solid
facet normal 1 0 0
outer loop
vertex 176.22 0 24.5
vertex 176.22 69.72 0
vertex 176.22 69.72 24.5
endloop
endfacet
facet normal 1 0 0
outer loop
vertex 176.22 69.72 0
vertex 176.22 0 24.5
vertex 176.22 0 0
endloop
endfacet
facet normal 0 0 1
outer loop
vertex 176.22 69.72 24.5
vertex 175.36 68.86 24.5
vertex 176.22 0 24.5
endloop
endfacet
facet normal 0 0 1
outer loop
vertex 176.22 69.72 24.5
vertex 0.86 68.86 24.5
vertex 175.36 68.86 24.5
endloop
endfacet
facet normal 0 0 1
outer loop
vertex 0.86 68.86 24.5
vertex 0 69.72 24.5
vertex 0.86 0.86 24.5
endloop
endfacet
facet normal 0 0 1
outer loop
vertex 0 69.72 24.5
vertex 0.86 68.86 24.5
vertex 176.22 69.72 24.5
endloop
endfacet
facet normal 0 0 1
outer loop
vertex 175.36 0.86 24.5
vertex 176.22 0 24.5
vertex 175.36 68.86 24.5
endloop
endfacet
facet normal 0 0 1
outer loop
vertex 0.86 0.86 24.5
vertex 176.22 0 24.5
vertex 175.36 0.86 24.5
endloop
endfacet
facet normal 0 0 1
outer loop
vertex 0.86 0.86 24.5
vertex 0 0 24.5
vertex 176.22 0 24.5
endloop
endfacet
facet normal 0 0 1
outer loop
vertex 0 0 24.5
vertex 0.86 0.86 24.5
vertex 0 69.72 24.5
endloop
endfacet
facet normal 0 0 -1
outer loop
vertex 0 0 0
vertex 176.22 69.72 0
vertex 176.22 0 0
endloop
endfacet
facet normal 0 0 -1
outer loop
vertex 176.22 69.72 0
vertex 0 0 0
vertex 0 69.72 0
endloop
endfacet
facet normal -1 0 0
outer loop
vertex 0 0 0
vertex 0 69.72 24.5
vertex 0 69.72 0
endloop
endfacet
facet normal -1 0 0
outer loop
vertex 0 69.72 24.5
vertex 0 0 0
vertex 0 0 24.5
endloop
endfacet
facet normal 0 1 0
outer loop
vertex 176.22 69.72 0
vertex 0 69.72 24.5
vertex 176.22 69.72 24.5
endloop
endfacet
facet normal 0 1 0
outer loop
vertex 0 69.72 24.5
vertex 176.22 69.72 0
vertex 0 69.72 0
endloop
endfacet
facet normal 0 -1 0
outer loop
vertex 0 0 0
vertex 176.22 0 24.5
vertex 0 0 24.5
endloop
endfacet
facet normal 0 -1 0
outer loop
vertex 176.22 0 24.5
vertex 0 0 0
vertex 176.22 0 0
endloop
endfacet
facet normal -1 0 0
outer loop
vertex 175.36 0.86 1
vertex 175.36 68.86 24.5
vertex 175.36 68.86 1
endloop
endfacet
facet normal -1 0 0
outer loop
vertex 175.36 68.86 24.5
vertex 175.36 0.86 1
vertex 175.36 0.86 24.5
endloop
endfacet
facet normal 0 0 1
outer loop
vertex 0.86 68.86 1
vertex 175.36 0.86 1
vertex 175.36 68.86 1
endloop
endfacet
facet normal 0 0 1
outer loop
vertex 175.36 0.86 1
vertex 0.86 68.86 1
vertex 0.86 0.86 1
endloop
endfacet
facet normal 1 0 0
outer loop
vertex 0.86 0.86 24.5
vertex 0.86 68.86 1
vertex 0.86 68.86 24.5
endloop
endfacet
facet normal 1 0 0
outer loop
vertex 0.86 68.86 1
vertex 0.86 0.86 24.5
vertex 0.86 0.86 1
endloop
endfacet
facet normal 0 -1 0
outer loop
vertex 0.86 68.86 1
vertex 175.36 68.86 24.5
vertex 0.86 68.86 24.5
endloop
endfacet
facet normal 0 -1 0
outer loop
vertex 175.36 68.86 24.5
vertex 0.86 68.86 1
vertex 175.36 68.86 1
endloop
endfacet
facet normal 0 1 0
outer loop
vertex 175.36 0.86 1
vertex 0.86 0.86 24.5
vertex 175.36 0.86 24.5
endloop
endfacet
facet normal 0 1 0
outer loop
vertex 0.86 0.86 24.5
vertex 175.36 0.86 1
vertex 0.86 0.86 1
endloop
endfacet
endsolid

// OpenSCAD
// file: ../lib/defaults.scad
WALL_WIDTH = 0.86;
BOTTOM_HEIGHT = 1.0;
STACK_HEIGHT = 2.5;
STACK_LEEWAY = 0.2;
RADIUS = 3.0;
// file: ../lib/cubes.scad
include<defaults.scad>;

/**
 * Stackable cube (full, no hole).
 *
 * Args:
 *     size: [depth, width, height] vector. These are total dimensions, including the pedestal.
 *     stack_size: [depth, width, height] vector. These are dimensions of the pedestal itself.
 */
module StackableCube(size, stack_size) {
    translate([ 0, 0, stack_size[2] ]) {
        hull() {
            cube([ size[0], size[1], size[2] - stack_size[2] ]);
            translate(
                [ (size[0] - stack_size[0]) / 2, (size[1] - stack_size[1]) / 2, -(size[0] - stack_size[0]) / 1.25 ]
            ) cube(stack_size);
        }
        translate([ (size[0] - stack_size[0]) / 2, (size[1] - stack_size[1]) / 2, -stack_size[2] ]) cube(stack_size);
    }
}

/**
 * Simple full cube with rounded vertical edges.
 *
 * Args:
 *     size: [depth, width, height] vector.
 *     radius: Vertical edge radius.
 */
module RoundCube(size, radius = RADIUS) {
    depth = size[0];
    width = size[1];
    height = size[2];
    hull() {
        translate([ radius, radius, 0 ]) cylinder(height, r = radius);
        translate([ depth - radius, radius, 0 ]) cylinder(height, r = radius);
        translate([ radius, width - radius, 0 ]) cylinder(height, r = radius);
        translate([ depth - radius, width - radius, 0 ]) cylinder(height, r = radius);
    }
}

/**
 * Stackable full cube with rounded vertical edges.
 *
 * Args:
 *     size: [depth, width, height] vector. These are total dimensions, including the pedestal.
 *     stack_size: [depth, width, height] vector. These are dimensions of the pedestal itself.
 *     radius: Vertical edge outer radius.
 */
module StackableRoundCube(size, stack_size, radius = RADIUS) {
    stack_radius = radius - (size[0] - stack_size[0]) / 2;

    translate([ 0, 0, stack_size[2] ]) {
        hull() {
            RoundCube([ size[0], size[1], size[2] - stack_size[2] ], radius = radius);

            translate(
                [ (size[0] - stack_size[0]) / 2, (size[1] - stack_size[1]) / 2, -(size[0] - stack_size[0]) / 1.25 ]
            ) RoundCube(stack_size, radius = stack_radius);
        }
        translate([ (size[0] - stack_size[0]) / 2, (size[1] - stack_size[1]) / 2, -stack_size[2] ])
            RoundCube(stack_size, radius = stack_radius);
    }
}
// file: ../lib/trays.scad
include<boxes.scad>;
include<defaults.scad>;
include<dividers.scad>;

module RoundTray(
    size, slopes = 4, angle = 45, dividers = undef, radius = RADIUS, wall_width = WALL_WIDTH,
    bottom_height = BOTTOM_HEIGHT
) {
    assert(slopes == 1 || slopes == 2 || slopes == 4, "Allowed number of slopes is 1, 2 or 4");

    depth = size[0] - 2 * wall_width;
    width = size[1] - 2 * wall_width;
    height = size[2] - bottom_height;

    // base_depth = depth - 2 * (tan(angle) * height);
    // base_width = width - 2 * (tan(angle) * height);

    if (slopes == 4) {
        _RoundTray(base_depth = depth - 2 * (tan(angle) * height), base_width = width - 2 * (tan(angle) * height));

    } else if (slopes == 2) {
        _RoundTray(base_depth = depth - 2 * (tan(angle) * height), base_width = width);
    } else if (slopes == 1) {
        _RoundTray(base_depth = depth - (tan(angle) * height), base_width = width);
    }

    module _RoundTray(base_depth, base_width) {
        difference() {
            RoundCube(size, radius = radius);
            translate([ wall_width, wall_width, bottom_height ]) hull() {
                translate([ 0, 0, height ]) RoundCube([ depth, width, 0.001 ], radius = radius * (base_depth / depth));
                translate([ (slopes > 1) ? (depth - base_depth) / 2 : 0, (width - base_width) / 2, 0 ])
                    RoundCube([ base_depth, base_width, 0.001 ], radius = radius * (base_width / width));
            }
            translate([ wall_width, wall_width, height + bottom_height - 0.001 ])
                RoundCube([ depth, width, 2 ], radius = radius);
        }
    }

    if (dividers != undef) {
        intersection() {
            RoundCube(size, radius = radius);
            Dividers(size, dividers = dividers, wall_width = wall_width);
        }
    }
}
// file: ../lib/dividers.scad
include<defaults.scad>;

/**
 * Vertical dividers.
 *
 * Args:
 *     size: [depth, width, height] vector of outer box size.
 *     dividers: [[x1, x2, ...], [y1, y2, ...]] for x, resp. y dividers.
 *     wall_width: Width of the dividers.
 */
module Dividers(size, dividers, wall_width = WALL_WIDTH) {
    depth = size[0];
    width = size[1];
    height = size[2];

    for (div = dividers[0]) {
        translate([ 0, div - wall_width / 2, 0 ]) cube([ depth, wall_width, height ]);
    }
    for (div = dividers[1]) {
        translate([ div - wall_width / 2, 0, 0 ]) cube([ wall_width, width, height ]);
    }
}

/**
 * Rounded vertical dividers.
 *
 * Args:
 *     size: [depth, width, height] vector of outer box size.
 *     dividers: [[x1, x2, ...], [y1, y2, ...]] for x, resp. y dividers.
 *     wall_width: Width of the dividers.
 *     radius: Radius of upper corners.
 */
module RoundDividers(size, dividers, wall_width = WALL_WIDTH, radius = RADIUS) {
    depth = size[0];
    width = size[1];
    height = size[2];

    intersection() {
        Dividers(size, dividers, wall_width = wall_width, radius = radius);

        hull() {
            translate([ radius, radius, height - radius ]) sphere(radius);
            translate([ radius, width - radius, height - radius ]) sphere(radius);
            translate([ depth - radius, width - radius, height - radius ]) sphere(radius);
            translate([ depth - radius, radius, height - radius ]) sphere(radius);

            translate([ radius, radius, 0 ]) cylinder(1, r = radius);
            translate([ radius, width - radius, 0 ]) cylinder(1, r = radius);
            translate([ depth - radius, width - radius, 0 ]) cylinder(1, r = radius);
            translate([ depth - radius, radius, 0 ]) cylinder(1, r = radius);
        }
    }
}
// file: ../lib/cardboxes.scad
include<boxes.scad>;
include<defaults.scad>;
include<dividers.scad>;

/**
 * Simple card box with rounded vertical edges.
 *
 * Args:
 *     size: [depth, width, height] vector.
 *     wall_width: Width of the vertical walls (except for one).
 *     bottom_height: Bottom thickness.
 *     radius: Vertical edge radius. Must be greater than wall_width.
 */
module RoundCardBox(size, dividers = undef, wall_width = WALL_WIDTH, bottom_height = BOTTOM_HEIGHT, radius = RADIUS) {
    module RoundCardBoxOuter(size, radius) {
        depth = size[0];
        width = size[1];
        height = size[2];
        hull() {
            translate([ radius, radius, 0 ]) cylinder(height, r = radius);
            translate([ radius, depth - radius, 0 ]) cylinder(height, r = radius);
            translate([ width - radius, 0, height - radius ]) rotate([ -90, 0, 0 ]) cylinder(depth, r = radius);
            translate([ width - 2 * radius, 0, 0 ]) cube([ 2 * radius, depth, 2 * radius ]);
        }
    }
    depth = size[0];
    width = size[1];
    height = size[2];

    difference() {
        RoundCardBoxOuter([ width, depth, height ], radius = radius);
        translate([ wall_width, wall_width, bottom_height ]) resize([ depth, width - 2 * wall_width, height ])
            RoundCardBoxOuter([ width, depth, height ], radius = radius - wall_width);
    }
    // translate([ depth - 12, 0, bottom_height - 0.001 ]) cube([ 5, width, 2.5 + 0.001 ]);
    if (dividers != undef) {
        intersection() {
            RoundCardBoxOuter([ width, depth, height ], radius = radius);
            Dividers(size, dividers = dividers, wall_width = wall_width);
        }
    }
}

/**
 * Simple card box.
 *
 * Args:
 *     size: [depth, width, height] vector.
 *     wall_width: Width of the vertical walls (except for one).
 *     bottom_height: Bottom thickness.
 */
module CardBox(size, dividers = undef, wall_width = WALL_WIDTH, bottom_height = BOTTOM_HEIGHT) {
    depth = size[0];
    width = size[1];
    height = size[2];

    difference() {
        cube([ depth, width, height ]);
        translate([ wall_width, wall_width, bottom_height ]) resize([ depth, width - 2 * wall_width, height ])
            cube([ depth, width, height ]);
    }
    translate([ depth - 12, 0, bottom_height - 0.001 ]) cube([ 5, width, 2.5 + 0.001 ]);
    if (dividers != undef) {
        intersection() {
            cube([ depth, width, height ]);
            Dividers(size, dividers = dividers, wall_width = wall_width);
        }
    }
}
// file: ../lib/boxes.scad
include<cubes.scad>;
include<defaults.scad>;
include<dividers.scad>;

/**
 * Simple square box with open top.
 *
 * Args:
 *     size: [depth, width, height] vector.
 *     wall_width: Width of the vertical walls.
 *     bottom_height: Bottom thickness.
 */
module SquareBox(size, wall_width = WALL_WIDTH, bottom_height = BOTTOM_HEIGHT) {
    depth = size[0];
    width = size[1];
    height = size[2];
    difference() {
        cube(size);
        translate([ wall_width, wall_width, bottom_height ])
            cube([ depth - 2 * wall_width, width - 2 * wall_width, height ]);
    }
}

/**
 * Stackable square box. Bottom is narrowed to fit in another box with same dimensions (stackable or not).
 *
 * Args:
 *     size: [depth, width, height] vector. These are total dimensions, including the pedestal.
 *     wall_width: Width of the vertical walls.
 *     bottom_height: Bottom thickness.
 *     stack_height: Height of the pedestal.
 *     leeway: Empty space between bottom outer dimensions and top inner dimensions to allow some wiggle between the
 *             boxes.
 */
module StackableSquareBox(
    size, wall_width = WALL_WIDTH, bottom_height = BOTTOM_HEIGHT, stack_height = STACK_HEIGHT, leeway = STACK_LEEWAY
) {
    depth = size[0];
    width = size[1];
    height = size[2] - stack_height;

    difference() {
        StackableCube(size, [ depth - 2 * wall_width - 2 * leeway, width - 2 * wall_width - 2 * leeway, stack_height ]);
        translate([ wall_width, wall_width, bottom_height ])
            resize([ depth - 2 * wall_width, width - 2 * wall_width, 2 * size[2] ]) StackableCube(
                size, [ depth - 2 * wall_width - 2 * leeway, width - 2 * wall_width - 2 * leeway, stack_height ]
            );
    }
}

/**
 * Simple box with rounded vertical edges.
 *
 * Args:
 *     size: [depth, width, height] vector.
 *     wall_width: Width of the vertical walls.
 *     bottom_height: Bottom thickness.
 *     radius: Vertical edge radius. Must be greater than wall_width.
 */
module RoundBox(size, wall_width = WALL_WIDTH, bottom_height = BOTTOM_HEIGHT, radius = RADIUS, dividers = undef) {
    depth = size[0];
    width = size[1];
    height = size[2];
    difference() {
        RoundCube(size, radius = radius);
        translate([ wall_width, wall_width, bottom_height ])
            RoundCube([ depth - 2 * wall_width, width - 2 * wall_width, height ], radius = radius - wall_width);
    }
    if (dividers != undef) {
        intersection() {
            RoundCube(size, radius = radius);
            Dividers(size, dividers = dividers, wall_width = wall_width);
        }
    }
}

/**
 * Stackable round box. Bottom is narrowed to fit in another box with same dimensions (stackable or not).
 *
 * Args:
 *     size: [depth, width, height] vector. These are total dimensions, including the pedestal.
 *     radius: Vertical edge outer radius.
 *     wall_width: Width of the vertical walls.
 *     bottom_height: Bottom thickness.
 *     stack_height: Height of the pedestal.
 *     leeway: Empty space between bottom outer dimensions and top inner dimensions to allow some wiggle between the
 *             boxes.
 */
module StackableRoundBox(
    size, radius = RADIUS, wall_width = WALL_WIDTH, bottom_height = BOTTOM_HEIGHT, stack_height = STACK_HEIGHT,
    leeway = STACK_LEEWAY
) {
    depth = size[0];
    width = size[1];
    height = size[2] - stack_height;

    difference() {
        StackableRoundCube(
            size, [ depth - 2 * wall_width - 2 * leeway, width - 2 * wall_width - 2 * leeway, stack_height ],
            radius = radius
        );
        translate([ wall_width, wall_width, bottom_height ])
            resize([ depth - 2 * wall_width, width - 2 * wall_width, 2 * size[2] ])

                StackableRoundCube(
                    size, [ depth - 2 * wall_width - 2 * leeway, width - 2 * wall_width - 2 * leeway, stack_height ],
                    radius = radius - wall_width
                );
    }
}

/**
 * Round spacer. Just perimeters, no top, no bottom.
 *
 * Args:
 *     size: [depth, width, height] vector.
 *     radius: Vertical edge outer radius.
 *     wall_width: Width of the vertical walls.
 */
module RoundSpacer(size, radius = RADIUS, wall_width = WALL_WIDTH) {
    depth = size[0];
    width = size[1];
    height = size[2];
    difference() {
        RoundCube(size, radius = radius);
        translate([ wall_width, wall_width, -1 ])
            RoundCube([ depth - 2 * wall_width, width - 2 * wall_width, height + 2 ], radius = radius);
    }
}
// main file
/*
 * Game box inner dimensions: [174, 66.5, 96]
 *
 * Rules: [174, 96, 2]
 * Cards: [63, 63, 46]
 */
// clang-format off
include <../lib/boxes.scad>;
include <../lib/cardboxes.scad>;
include <../lib/dividers.scad>;
include <../lib/trays.scad>;
// clang-format on

$fa = 1;
$fs = 0.4;

WALL_WIDTH = 1.26;
BOTTOM_HEIGHT = 1.2;
STACK_HEIGHT = 3.0;
STACK_LEEWAY = 0.2;
RADIUS = 3.0;

module CardsBox() {
    difference() { // 99 -> 66
        SquareBox([ 64, 66.5, 65 ]);
        translate([ 70, (66.5 - 35) / 2, 15 ]) rotate([ 0, -90, 0 ]) RoundCube([ 100, 35, 100 ], radius = 5);
        translate([ 30, 66.5 / 2, 76 ]) rotate([ 45, 0, 0 ]) rotate([ 0, 90, 0 ]) cube([ 50, 50, 100 ], center = true);
    }
}

module TokensTray1() { RoundTray([ 64, 108, 14 ], slopes = 4, angle = 35, dividers = [ [108 / 2 + 5], [64 / 2] ]); }

module TokensTray2() {
    RoundTray([ 64, 108, 20 ], slopes = 2, angle = 33, dividers = [ [ 108 / 3, 108 * 2 / 3 ], [] ]);
}

module MeeplesBox() {
    difference() {
        SquareBox([ 65, 64, 22.5 ]);
        hull() {
            translate([ 0, 64 / 2, 22.5 / 2 + 5 ]) rotate([ 0, 90, 0 ]) cylinder(h = 10, d = 18, center = true);
            translate([ 0, 64 / 2, 50 ]) rotate([ 0, 90, 0 ]) cylinder(h = 10, d = 18, center = true);
        }
    }
}

// module WallsBox() { SquareBox([ 21, 52, 40 ]); }
// module WallsBox() {
//     difference() {
//         SquareBox([ 32, 66, 35.5 ], wall_width = 0.84);
//         translate([ -10, (66 - 36) / 2, BOTTOM_HEIGHT ]) cube([ 50, 36, 50 ]);
//     }
// }

module DiceBox() {
    RoundBox([ 64, 66, 14 ], bottom_height = 1.0);
    //
}

module WallsBox() {
    difference() {
        union() {

            SquareBox([ 64, 66, 21 ], wall_width = 0.84);
            cube([ 7, 13, 21 ]);
            translate([ 0, 53, 0 ]) cube([ 7, 13, 21 ]);
            translate([ 57, 0, 0 ]) cube([ 7, 13, 21 ]);
            translate([ 57, 53, 0 ]) cube([ 7, 13, 21 ]);
        }
        translate([ -1, 13, -1 ]) cube([ 8, 66 - 2 * 13, 23 ]);
        translate([ 57, 13, -1 ]) cube([ 8, 66 - 2 * 13, 23 ]);
        translate([ 22, 11, -4 ]) linear_extrude(10) {
            translate([ 2, 0 ]) square([ 16, 30 ]);
            translate([ 10, 15 ]) rotate(45) difference() {
                square([ 20, 20 ]);
                translate([ 30, -30 ]) rotate(45) square([ 10 * sqrt(2), 100 ]);
            }
        }
    }
}

module LidSpacer() {
    wall_width = 0.86;
    bottom_height = 1.0;
    SquareBox(
        [ 174.5 + 2 * wall_width, 68 + 2 * wall_width, 23.5 + bottom_height ], bottom_height = bottom_height,
        wall_width = wall_width
    );

    // wall_width = 0.7;
    //
    // difference() {
    //     cube([ 173.5 + 2 * wall_width, 66.5 + 2 * wall_width, 17 ]);
    //     translate([ wall_width, wall_width, -1 ]) cube([ 173.5, 66.5, 19 ]);
    // }
}

LidSpacer();
// WallsBox();
// DiceBox();
// MeeplesBox();
// CardsBox();
// TokensTray1();
// translate([ 23, 12, 0 ]) color("red") cylinder(d = 18.5, h = 3);
// translate([ 40, 24, 0 ]) color("red") cylinder(d = 18.5, h = 3);
